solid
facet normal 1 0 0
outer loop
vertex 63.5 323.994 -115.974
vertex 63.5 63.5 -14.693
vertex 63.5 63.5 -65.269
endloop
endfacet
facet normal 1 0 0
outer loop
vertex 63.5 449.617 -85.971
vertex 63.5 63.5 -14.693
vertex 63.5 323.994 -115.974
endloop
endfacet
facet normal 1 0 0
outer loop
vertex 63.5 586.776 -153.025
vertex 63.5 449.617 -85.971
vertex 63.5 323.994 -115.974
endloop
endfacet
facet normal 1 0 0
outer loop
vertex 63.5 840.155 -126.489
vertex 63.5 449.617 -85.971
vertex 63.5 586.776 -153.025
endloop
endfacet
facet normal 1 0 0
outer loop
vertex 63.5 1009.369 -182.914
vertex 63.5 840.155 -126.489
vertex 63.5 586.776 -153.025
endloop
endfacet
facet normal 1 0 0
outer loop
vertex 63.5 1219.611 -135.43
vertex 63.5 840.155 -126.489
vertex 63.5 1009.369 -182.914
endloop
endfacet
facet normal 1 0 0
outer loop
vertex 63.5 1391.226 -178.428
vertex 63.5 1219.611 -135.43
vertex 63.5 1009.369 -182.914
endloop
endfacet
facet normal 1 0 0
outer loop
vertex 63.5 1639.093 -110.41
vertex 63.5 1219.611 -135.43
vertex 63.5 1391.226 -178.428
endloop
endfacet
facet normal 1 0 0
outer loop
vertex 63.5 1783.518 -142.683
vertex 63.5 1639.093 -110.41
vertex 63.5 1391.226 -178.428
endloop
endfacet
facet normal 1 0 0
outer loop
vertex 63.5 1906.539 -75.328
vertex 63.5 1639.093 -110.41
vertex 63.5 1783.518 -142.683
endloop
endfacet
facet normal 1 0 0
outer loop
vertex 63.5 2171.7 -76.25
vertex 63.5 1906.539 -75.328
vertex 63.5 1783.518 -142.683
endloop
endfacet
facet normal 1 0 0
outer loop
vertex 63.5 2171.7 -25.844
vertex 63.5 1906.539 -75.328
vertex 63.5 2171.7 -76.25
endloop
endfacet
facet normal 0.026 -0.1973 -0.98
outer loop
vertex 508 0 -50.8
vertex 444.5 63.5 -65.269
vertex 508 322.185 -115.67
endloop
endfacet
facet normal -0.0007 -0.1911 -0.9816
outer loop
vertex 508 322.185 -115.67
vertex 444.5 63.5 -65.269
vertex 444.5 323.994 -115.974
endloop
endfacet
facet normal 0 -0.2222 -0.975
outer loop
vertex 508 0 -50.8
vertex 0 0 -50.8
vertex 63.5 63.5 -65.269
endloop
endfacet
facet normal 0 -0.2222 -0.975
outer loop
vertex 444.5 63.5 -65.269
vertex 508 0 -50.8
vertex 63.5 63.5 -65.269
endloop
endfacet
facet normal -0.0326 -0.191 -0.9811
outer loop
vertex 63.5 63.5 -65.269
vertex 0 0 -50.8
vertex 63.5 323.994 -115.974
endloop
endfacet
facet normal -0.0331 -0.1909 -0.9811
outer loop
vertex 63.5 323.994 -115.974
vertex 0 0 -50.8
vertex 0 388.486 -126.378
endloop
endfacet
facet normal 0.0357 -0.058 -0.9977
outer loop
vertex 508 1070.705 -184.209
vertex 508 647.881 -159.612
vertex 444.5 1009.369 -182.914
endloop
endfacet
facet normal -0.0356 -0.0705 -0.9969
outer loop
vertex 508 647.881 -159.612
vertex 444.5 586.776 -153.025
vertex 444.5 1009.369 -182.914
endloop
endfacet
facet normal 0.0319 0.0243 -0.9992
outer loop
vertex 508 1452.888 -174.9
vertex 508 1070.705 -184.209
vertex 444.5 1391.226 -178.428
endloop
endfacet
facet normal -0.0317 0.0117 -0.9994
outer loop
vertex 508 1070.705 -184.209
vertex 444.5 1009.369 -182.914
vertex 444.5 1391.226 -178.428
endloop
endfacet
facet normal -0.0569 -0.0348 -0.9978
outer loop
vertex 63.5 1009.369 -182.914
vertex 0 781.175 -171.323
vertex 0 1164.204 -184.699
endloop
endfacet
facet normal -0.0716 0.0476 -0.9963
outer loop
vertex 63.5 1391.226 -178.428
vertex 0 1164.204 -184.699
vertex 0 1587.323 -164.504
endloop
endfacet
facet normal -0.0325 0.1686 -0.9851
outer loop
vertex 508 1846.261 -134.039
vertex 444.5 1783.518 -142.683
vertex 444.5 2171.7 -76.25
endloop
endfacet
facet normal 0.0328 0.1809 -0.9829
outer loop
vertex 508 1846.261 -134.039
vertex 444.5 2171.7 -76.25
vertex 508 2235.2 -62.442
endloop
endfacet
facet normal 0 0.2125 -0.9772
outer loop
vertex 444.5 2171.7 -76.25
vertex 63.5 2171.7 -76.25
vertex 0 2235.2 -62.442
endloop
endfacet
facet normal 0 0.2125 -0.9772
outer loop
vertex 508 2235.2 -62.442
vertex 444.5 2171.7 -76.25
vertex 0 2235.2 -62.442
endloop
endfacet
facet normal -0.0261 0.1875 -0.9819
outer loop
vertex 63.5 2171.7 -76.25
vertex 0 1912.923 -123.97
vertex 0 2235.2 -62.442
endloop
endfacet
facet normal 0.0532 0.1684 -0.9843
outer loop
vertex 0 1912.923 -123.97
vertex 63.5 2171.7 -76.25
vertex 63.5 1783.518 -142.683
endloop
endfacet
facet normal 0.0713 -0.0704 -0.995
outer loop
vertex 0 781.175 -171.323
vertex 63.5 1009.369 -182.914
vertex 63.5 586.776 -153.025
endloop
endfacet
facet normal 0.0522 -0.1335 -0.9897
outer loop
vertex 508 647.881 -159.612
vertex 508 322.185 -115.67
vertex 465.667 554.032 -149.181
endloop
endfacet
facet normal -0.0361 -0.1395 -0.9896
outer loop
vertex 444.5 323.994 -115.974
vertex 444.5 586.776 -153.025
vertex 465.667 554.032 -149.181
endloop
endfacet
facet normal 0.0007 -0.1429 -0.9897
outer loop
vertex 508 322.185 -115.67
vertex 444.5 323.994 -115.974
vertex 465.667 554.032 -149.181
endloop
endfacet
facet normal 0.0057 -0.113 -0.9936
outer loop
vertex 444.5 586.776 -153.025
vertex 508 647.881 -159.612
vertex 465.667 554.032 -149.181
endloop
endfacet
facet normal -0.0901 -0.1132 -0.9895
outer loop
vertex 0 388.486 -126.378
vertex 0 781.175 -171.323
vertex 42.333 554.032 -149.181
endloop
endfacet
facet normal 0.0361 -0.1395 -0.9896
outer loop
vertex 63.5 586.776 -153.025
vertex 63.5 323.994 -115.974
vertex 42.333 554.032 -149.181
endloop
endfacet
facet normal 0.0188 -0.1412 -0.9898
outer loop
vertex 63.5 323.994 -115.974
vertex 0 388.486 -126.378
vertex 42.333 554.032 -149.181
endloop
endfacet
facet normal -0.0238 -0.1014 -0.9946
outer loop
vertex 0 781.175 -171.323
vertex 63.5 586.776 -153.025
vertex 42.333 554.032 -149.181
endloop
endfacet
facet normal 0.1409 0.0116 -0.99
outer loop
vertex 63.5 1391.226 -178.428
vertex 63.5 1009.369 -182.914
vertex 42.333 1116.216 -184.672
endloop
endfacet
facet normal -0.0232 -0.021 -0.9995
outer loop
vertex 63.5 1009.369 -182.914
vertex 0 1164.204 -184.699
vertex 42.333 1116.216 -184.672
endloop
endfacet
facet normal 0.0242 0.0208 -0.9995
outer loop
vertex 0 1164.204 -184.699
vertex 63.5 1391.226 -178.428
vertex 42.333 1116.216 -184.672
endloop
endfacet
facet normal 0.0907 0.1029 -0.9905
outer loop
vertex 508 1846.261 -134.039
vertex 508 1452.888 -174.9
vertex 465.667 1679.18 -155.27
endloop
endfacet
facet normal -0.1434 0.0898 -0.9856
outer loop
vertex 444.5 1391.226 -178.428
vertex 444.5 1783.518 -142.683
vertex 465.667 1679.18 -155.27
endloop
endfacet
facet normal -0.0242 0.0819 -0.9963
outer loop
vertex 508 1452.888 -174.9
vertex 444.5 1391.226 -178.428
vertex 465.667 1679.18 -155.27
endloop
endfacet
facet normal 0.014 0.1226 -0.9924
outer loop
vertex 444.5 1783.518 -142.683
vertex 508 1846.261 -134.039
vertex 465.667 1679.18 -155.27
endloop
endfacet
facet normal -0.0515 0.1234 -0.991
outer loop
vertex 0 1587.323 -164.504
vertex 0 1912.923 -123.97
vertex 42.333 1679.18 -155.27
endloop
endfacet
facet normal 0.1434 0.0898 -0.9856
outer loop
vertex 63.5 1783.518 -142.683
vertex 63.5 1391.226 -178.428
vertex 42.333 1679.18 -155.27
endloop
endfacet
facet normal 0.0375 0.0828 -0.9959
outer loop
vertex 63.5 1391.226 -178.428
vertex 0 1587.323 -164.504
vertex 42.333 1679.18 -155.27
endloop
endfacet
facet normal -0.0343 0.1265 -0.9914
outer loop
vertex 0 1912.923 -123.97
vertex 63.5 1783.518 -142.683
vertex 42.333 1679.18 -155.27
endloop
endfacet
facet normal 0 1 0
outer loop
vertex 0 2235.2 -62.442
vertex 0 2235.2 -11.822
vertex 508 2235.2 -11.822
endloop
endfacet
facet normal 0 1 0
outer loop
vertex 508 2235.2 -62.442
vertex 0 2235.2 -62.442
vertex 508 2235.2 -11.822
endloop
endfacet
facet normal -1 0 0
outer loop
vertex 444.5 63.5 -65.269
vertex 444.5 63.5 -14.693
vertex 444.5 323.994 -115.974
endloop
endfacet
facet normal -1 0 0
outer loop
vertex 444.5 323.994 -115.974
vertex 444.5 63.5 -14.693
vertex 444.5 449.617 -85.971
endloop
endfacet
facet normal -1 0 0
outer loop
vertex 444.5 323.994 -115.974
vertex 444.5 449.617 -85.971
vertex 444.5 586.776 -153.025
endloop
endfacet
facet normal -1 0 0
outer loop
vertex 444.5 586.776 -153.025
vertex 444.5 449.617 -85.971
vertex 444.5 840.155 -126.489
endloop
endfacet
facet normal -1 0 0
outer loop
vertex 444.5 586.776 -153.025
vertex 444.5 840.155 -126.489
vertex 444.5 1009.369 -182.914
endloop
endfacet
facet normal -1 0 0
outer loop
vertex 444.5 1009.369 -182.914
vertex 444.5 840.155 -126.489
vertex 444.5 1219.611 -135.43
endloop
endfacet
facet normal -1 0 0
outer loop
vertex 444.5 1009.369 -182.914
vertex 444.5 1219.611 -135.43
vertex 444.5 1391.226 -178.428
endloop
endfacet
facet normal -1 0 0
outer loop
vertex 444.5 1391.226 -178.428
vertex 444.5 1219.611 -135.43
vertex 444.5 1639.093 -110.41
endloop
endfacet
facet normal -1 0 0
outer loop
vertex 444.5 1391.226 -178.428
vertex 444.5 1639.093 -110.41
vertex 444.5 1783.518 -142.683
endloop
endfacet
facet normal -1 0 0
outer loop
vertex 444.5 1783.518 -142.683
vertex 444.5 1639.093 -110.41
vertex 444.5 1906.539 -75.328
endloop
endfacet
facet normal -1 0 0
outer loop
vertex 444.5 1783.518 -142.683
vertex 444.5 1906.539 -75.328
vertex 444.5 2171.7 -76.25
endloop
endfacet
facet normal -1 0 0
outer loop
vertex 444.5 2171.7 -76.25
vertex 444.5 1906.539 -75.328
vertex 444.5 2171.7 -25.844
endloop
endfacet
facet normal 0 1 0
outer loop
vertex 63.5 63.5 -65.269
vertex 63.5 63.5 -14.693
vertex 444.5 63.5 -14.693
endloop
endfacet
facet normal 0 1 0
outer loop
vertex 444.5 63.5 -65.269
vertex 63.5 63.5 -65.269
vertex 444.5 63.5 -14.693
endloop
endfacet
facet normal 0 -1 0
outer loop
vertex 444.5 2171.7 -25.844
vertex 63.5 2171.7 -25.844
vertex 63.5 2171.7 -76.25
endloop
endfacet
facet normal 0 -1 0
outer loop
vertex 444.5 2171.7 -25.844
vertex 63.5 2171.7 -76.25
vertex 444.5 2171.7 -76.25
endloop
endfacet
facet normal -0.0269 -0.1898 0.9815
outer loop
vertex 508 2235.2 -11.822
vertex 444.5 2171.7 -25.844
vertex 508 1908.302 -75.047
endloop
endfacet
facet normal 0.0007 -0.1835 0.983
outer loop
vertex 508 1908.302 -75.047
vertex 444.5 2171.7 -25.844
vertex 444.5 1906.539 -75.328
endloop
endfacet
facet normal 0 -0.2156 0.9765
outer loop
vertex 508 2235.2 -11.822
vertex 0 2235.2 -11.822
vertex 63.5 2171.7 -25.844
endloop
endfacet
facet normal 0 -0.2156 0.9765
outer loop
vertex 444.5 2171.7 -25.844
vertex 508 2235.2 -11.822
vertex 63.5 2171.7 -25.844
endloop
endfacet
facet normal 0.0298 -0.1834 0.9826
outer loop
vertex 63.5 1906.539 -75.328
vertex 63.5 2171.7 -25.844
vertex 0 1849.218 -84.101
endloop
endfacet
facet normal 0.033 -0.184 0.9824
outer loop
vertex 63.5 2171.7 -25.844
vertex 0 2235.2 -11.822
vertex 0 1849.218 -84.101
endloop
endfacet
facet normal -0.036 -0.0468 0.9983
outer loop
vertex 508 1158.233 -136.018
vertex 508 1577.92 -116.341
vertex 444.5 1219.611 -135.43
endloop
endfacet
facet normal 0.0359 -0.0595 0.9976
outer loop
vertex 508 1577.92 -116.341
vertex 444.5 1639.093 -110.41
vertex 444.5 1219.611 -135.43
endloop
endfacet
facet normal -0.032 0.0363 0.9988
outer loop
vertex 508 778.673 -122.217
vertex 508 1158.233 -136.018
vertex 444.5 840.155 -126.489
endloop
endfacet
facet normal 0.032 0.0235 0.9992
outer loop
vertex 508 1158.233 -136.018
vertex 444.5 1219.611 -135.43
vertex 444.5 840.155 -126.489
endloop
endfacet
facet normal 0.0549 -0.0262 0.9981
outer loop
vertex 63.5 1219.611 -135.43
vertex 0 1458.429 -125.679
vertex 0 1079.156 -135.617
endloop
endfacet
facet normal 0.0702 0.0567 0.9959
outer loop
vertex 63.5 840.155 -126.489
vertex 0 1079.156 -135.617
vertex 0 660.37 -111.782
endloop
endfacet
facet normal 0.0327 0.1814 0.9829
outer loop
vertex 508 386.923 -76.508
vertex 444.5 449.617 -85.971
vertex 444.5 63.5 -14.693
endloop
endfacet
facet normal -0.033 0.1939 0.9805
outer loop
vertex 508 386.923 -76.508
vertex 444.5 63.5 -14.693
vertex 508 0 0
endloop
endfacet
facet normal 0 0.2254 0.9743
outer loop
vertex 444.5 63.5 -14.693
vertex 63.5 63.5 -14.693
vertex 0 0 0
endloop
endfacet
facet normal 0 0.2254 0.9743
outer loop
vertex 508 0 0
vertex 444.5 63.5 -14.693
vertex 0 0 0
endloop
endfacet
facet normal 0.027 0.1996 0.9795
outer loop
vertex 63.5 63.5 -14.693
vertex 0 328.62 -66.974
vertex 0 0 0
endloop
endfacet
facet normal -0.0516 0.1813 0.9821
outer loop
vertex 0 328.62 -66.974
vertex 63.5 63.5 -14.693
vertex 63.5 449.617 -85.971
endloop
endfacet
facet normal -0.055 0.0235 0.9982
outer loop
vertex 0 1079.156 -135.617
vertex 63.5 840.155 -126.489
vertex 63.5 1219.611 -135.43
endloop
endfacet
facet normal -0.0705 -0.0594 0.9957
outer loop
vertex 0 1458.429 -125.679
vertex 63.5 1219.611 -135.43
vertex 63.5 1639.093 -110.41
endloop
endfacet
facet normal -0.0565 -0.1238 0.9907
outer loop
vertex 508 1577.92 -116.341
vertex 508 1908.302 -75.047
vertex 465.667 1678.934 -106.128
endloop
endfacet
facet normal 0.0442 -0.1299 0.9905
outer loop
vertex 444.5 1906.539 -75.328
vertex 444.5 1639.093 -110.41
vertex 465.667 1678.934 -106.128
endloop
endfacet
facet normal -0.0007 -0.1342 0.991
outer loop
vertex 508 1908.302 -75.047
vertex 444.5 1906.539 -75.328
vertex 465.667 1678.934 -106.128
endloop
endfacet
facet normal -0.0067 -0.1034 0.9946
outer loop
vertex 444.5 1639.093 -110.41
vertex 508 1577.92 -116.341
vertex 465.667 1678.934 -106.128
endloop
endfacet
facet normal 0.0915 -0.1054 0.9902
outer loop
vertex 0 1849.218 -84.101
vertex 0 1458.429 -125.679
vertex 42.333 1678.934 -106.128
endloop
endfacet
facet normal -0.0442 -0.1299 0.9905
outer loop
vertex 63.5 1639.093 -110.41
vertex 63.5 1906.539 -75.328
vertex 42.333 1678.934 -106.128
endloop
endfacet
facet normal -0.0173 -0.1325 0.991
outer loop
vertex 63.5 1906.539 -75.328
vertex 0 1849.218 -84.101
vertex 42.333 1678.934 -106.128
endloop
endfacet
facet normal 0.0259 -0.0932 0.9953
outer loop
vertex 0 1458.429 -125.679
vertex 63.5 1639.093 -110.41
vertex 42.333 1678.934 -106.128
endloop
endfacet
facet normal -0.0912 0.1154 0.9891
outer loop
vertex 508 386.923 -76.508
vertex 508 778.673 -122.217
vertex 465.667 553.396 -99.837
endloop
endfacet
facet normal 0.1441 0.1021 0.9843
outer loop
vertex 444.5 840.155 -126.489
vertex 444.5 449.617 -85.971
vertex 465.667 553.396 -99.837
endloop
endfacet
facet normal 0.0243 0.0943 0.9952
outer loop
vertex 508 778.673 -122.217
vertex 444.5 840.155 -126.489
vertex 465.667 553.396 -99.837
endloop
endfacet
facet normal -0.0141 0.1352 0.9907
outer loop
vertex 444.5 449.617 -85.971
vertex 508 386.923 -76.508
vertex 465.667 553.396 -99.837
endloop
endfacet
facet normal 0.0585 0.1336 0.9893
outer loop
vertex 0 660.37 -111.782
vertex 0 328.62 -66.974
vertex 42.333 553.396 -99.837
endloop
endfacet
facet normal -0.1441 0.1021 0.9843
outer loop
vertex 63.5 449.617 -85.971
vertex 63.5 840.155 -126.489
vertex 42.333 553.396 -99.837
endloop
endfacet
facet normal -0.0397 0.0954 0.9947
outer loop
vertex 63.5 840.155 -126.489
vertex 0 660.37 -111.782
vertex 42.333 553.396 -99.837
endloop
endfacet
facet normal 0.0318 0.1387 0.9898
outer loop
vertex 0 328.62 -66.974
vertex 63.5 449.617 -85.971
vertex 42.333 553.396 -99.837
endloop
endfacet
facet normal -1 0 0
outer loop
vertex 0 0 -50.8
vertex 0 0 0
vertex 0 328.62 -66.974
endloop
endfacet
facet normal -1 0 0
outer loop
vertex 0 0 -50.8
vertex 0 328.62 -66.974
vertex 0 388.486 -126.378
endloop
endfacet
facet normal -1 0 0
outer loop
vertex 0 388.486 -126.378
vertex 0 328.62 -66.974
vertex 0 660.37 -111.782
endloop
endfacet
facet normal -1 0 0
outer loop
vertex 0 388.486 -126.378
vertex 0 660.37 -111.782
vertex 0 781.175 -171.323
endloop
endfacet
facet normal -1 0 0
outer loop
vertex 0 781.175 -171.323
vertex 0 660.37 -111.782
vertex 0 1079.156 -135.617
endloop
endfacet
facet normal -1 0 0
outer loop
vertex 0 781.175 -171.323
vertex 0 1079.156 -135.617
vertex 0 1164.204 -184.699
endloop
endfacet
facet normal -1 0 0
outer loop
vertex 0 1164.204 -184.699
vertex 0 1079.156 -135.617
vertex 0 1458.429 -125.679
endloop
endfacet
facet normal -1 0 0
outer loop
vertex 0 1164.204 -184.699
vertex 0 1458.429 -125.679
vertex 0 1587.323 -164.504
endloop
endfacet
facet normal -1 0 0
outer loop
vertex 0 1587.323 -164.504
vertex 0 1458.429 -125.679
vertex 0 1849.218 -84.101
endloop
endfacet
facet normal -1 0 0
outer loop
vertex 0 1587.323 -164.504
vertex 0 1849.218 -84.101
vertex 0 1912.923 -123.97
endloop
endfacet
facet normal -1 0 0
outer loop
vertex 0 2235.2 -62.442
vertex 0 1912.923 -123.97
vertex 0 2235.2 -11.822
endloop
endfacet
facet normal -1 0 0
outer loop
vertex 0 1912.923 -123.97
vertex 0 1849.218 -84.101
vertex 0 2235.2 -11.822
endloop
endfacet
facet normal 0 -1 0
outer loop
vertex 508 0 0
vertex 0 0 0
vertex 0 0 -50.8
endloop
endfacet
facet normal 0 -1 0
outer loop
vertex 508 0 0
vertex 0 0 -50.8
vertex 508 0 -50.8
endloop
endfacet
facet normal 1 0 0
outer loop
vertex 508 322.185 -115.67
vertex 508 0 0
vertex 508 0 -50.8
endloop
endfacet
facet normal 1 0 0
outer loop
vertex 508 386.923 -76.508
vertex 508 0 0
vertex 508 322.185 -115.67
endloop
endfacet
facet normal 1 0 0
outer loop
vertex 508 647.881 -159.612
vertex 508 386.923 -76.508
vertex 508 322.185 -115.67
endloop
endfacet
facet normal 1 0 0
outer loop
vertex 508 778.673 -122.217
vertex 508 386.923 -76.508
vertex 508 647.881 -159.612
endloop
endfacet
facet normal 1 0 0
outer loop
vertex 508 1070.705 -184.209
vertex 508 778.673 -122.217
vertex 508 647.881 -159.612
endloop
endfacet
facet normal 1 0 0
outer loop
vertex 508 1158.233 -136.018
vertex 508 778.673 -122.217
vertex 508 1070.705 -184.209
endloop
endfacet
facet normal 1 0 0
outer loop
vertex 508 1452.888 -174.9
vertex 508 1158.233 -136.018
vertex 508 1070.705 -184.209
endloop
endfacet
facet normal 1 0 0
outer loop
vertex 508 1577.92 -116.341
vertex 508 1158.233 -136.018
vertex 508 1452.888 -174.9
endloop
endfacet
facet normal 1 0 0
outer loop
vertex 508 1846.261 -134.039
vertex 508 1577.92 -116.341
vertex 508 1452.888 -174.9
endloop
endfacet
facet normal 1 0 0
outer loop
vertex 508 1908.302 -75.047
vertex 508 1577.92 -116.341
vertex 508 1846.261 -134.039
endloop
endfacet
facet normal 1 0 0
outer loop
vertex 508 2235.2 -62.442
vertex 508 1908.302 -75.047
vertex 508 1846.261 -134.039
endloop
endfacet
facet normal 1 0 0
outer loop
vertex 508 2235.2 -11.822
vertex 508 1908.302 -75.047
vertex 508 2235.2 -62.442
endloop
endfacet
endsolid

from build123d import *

# Parameters (mm, degrees)
SKETCH1_W           = 508
SKETCH1_H           = 2235.2
BOSS_EXTRUDE1_DEPTH = 317.5
CUT_EXTRUDE1_DEPTH  = 2315.084978993
SKETCH4_W           = 381
SKETCH4_H           = 2108.2
CUT_EXTRUDE2_DEPTH  = 635


with BuildPart() as part:
    # Sketch1 → Boss-Extrude1 (new, symmetric)
    with BuildSketch(Plane.XY):
        with Locations((254, 1117.6)):
            Rectangle(SKETCH1_W, SKETCH1_H)
    extrude(amount=BOSS_EXTRUDE1_DEPTH, both=True)

    # Sketch3 → Cut-Extrude1 (cut, through all)
    with BuildSketch(Plane(origin=(0, 0, 0), x_dir=(0, 0, -1), z_dir=(1, 0, 0))):
        with BuildLine():
            add(Edge.make_bspline(
                [(11.821569446, 2235.2), (53.57813934, 2051.592772393), (85.222640891, 1866.207447857), (107.434189609, 1667.229087385), (108.698878545, 1655.516041361), (111.142504459, 1632.089911804), (114.679903907, 1596.945609992), (122.036747111, 1514.906454342), (126.801961515, 1444.525721695), (134.27079546, 1303.68201965), (136.501210965, 1209.676568729), (135.828775663, 1092.031717992), (135.367512593, 1056.727910054), (134.516268219, 1021.408545813), (133.862033824, 997.858843012), (133.491664454, 986.086879756), (131.424864721, 927.264731081), (129.082951268, 880.304237017), (120.017272868, 739.710830806), (111.253713841, 646.365974306), (77.002317609, 367.455601671), (43.555969623, 183.013970543), (0, 0)],
                knots=[0, 0, 0, 0, 0.25, 0.25, 0.265625, 0.265625, 0.28125, 0.3125, 0.375, 0.375, 0.5, 0.5, 0.53125, 0.546875, 0.546875, 0.5625, 0.5625, 0.625, 0.625, 0.75, 0.75, 1, 1, 1, 1], degree=3))
            Line((0, 0), (-317.5, 0))
            Line((-317.5, 0), (-317.5, 2235.2))
            Line((-317.5, 2235.2), (11.821569446, 2235.2))
        make_face()
        with BuildLine():
            add(Edge.make_bspline(
                [(50.8, 0), (93.756857966, 183.282593988), (126.706271475, 367.938495881), (160.41784485, 647.078560023), (169.0357287, 740.484692023), (176.456558681, 857.702282187), (178.431425593, 892.902056056), (180.026988846, 928.153881246), (181.00615785, 951.666699325), (181.45337598, 963.426998719), (183.476257054, 1022.212785523), (184.41367603, 1069.223486353), (185.187938722, 1210.201925792), (182.986794075, 1304.116001508), (175.627644988, 1444.880277597), (171.716032673, 1503.509801444), (166.750196414, 1562.111566197), (164.679571807, 1585.55005263), (163.601939023, 1597.269959678), (160.24444438, 1632.408236744), (157.839846087, 1655.8074259), (134.712079658, 1866.164757361), (103.588202999, 2051.475930795), (62.441666667, 2235.2)],
                knots=[0, 0, 0, 0, 0.25, 0.25, 0.375, 0.375, 0.40625, 0.421875, 0.421875, 0.4375, 0.4375, 0.5, 0.5, 0.625, 0.625, 0.6875, 0.703125, 0.703125, 0.71875, 0.71875, 0.75, 0.75, 1, 1, 1, 1], degree=3))
            Line((62.441666667, 2235.2), (317.5, 2235.2))
            Line((317.5, 2235.2), (317.5, 0))
            Line((317.5, 0), (50.8, 0))
        make_face()
    extrude(amount=CUT_EXTRUDE1_DEPTH, mode=Mode.SUBTRACT)

    # Sketch4 → Cut-Extrude2 (cut)
    with BuildSketch(Plane.XY):
        with Locations((254, 1117.6)):
            Rectangle(SKETCH4_W, SKETCH4_H)
    extrude(amount=-CUT_EXTRUDE2_DEPTH, mode=Mode.SUBTRACT)


solid = part.part
